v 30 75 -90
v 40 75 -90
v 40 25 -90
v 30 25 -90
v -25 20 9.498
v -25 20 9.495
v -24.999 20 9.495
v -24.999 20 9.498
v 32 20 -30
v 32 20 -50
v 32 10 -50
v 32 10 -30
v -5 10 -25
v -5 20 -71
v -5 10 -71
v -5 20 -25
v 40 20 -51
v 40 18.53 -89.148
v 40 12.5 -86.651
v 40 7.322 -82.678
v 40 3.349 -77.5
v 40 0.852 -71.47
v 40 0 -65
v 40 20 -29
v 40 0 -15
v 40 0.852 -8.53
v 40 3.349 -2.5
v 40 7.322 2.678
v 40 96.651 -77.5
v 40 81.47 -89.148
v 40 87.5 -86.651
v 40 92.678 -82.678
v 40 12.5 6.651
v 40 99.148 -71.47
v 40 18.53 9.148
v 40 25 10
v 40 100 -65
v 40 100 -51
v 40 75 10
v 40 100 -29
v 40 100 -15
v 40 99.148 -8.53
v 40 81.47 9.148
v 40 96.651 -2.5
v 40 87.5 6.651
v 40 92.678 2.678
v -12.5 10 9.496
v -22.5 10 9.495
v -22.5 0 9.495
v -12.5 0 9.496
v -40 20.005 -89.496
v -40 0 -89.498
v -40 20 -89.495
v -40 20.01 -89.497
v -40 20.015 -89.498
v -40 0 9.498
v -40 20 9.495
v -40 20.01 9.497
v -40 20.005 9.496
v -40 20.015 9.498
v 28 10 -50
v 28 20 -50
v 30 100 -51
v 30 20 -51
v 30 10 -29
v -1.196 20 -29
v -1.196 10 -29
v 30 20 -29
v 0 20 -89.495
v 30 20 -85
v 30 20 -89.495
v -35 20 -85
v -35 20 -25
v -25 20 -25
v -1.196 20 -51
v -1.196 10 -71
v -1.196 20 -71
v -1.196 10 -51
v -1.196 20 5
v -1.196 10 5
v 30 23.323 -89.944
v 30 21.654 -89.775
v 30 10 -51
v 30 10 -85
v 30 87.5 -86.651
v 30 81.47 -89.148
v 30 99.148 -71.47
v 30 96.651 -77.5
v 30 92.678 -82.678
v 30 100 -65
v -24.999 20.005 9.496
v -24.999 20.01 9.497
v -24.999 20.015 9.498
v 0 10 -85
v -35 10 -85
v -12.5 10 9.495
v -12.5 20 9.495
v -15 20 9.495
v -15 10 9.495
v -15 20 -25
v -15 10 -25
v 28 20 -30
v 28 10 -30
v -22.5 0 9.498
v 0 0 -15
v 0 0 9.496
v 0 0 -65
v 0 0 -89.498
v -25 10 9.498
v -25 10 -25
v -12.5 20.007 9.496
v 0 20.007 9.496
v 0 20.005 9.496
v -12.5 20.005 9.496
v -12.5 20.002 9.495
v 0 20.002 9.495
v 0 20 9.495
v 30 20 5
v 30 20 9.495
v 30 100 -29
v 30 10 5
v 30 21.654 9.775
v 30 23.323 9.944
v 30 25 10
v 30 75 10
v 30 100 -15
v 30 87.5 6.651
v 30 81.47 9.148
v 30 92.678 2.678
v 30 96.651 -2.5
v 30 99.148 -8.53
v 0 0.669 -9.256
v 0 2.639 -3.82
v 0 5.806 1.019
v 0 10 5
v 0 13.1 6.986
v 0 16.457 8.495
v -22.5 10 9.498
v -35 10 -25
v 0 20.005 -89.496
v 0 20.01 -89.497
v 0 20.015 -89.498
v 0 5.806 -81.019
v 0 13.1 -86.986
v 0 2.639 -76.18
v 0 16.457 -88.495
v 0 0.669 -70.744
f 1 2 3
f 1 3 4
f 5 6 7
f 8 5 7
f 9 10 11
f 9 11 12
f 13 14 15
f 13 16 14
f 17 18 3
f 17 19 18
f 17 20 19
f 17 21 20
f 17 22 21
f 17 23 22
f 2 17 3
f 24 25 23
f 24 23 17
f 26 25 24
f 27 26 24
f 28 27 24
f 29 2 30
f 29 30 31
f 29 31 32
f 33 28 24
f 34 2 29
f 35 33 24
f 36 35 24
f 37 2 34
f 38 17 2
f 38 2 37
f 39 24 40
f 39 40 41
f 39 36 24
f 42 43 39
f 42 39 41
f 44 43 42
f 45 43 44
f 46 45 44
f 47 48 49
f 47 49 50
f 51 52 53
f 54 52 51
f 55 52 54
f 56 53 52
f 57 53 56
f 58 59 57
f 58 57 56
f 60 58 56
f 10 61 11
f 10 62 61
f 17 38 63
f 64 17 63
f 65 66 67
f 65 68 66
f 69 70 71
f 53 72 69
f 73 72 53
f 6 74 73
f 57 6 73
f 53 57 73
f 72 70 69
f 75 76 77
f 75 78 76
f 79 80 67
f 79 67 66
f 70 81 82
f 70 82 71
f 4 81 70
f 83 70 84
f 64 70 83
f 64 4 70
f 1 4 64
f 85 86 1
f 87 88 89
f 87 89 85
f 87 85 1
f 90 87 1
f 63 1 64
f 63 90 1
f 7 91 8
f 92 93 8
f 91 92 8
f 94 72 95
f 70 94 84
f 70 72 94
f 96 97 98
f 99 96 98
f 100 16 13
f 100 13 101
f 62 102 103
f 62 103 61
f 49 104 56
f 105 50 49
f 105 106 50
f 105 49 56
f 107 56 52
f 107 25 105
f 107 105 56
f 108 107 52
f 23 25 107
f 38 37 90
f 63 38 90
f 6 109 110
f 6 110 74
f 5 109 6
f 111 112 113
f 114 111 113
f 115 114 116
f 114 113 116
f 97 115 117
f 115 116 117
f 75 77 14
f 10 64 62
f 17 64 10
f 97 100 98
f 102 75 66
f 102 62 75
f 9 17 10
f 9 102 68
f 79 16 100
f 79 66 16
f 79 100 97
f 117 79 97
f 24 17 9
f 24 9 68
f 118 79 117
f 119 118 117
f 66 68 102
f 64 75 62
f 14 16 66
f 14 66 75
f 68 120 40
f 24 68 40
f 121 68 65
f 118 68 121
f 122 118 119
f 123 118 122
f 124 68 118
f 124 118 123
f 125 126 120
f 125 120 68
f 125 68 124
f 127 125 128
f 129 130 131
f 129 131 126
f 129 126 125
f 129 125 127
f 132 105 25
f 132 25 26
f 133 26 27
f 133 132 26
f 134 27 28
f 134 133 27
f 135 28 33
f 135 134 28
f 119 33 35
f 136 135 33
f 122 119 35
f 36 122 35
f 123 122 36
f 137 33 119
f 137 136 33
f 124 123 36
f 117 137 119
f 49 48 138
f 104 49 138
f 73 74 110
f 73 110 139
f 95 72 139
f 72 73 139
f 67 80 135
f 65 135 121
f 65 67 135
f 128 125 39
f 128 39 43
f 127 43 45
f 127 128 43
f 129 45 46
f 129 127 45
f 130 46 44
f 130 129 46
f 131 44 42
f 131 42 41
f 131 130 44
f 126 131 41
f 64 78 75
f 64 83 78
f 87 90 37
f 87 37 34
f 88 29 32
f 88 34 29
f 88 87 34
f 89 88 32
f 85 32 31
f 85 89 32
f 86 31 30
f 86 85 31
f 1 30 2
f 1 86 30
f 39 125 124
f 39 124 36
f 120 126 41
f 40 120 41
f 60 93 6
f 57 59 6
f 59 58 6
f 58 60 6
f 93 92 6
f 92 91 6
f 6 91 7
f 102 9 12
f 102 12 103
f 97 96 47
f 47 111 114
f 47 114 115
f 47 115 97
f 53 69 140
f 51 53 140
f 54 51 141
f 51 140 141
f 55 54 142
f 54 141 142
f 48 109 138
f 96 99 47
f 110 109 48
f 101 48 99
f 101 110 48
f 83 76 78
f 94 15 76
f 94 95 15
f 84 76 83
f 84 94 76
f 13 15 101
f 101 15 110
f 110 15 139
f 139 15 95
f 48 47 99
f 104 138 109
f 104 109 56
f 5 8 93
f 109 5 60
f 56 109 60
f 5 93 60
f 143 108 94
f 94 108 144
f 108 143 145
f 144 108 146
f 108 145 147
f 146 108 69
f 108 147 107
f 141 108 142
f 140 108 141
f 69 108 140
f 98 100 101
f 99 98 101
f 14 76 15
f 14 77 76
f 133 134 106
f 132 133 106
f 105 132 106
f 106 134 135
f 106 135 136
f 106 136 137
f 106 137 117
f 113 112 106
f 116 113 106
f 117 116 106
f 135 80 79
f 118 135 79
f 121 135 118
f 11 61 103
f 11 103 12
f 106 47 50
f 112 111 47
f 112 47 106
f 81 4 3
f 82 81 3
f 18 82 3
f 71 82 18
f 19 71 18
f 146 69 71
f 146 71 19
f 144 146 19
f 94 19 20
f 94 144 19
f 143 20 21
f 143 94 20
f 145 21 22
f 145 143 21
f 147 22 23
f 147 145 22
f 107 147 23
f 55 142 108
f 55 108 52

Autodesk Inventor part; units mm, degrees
ref_plane "YZ Plane" through (0, 0, 0) normal (1, 0, 0) x (0, 1, 0)
sketch "Esquisse1" plane through (0, 0, 0) normal (0, 1, 0) x (-1, 0, 0)
  line L0 (0, 0) -> (-40, 0)
  line L1 (-40, 0) -> (-40, -80)
  line L2 (-40, -80) -> (0, -80)
  line L3 (0, -80) -> (0, 0)
  dimension "d0" = 80
  dimension "d4" = 40
extrude "Extrusion1" add sketch "Esquisse1" along normal blind 80
sketch "Esquisse2" plane through (40, 0, 0) normal (1, 0, 0) x (0, 0, -1)
  point P0 (0, 0)
sketch "Esquisse3" plane through (40, 0, 0) normal (1, 0, 0) x (0, 0, -1)
  line L0 (0, 80) -> (80, 80) projected
  line L1 (20, 20) -> (60, 20)
  line L2 (60, 20) -> (60, 80)
  line L3 (60, 80) -> (20, 80)
  line L4 (20, 80) -> (20, 20)
  line L5 (0, 0) -> (80, 0) projected
  line L6 (80, 0) -> (80, 80) projected
  line L7 (0, 0) -> (0, 80) projected
  point P0 (20, 80)
  dimension "d9" = 20
  dimension "d10" = 20
  dimension "d11" = 20
extrude "Extrusion2" cut sketch "Esquisse3" against normal blind 80 contours L0 L2 L1 L4
sketch "Esquisse4" plane through (40, 20, -20) normal (0, 1, 0) x (1, 0, 0)
  line L0 (0, 40) -> (-40, 40) projected
  line L1 (0, 0) -> (-5, 0)
  line L2 (-5, 40) -> (0, 40)
  line L3 (0, 40) -> (0, 0)
  line L4 (-5, 40) -> (-10, 40)
  line L5 (-9, 10) -> (-12, 10)
  line L6 (-12, 10) -> (-12, 30)
  line L7 (-12, 30) -> (-9, 30)
  line L8 (-9, 10) -> (-9, 30)
  point P0 (-40, -20)
  dimension "d19" = 20
  dimension "d21" = 9
  dimension "d22" = 3
extrude "Extrusion3" cut sketch "Esquisse4" against normal blind 10
sketch "Esquisse6" plane through (40, 20, -20) normal (0, 0, -1) x (-1, 0, 0)
  line L0 (40, 60) -> (40, 0) projected
  line L1 (0, 60) -> (40, 60) projected
  line L2 (0, 0) -> (0, 60) projected
  line L3 (0, 0) -> (40, 0) projected
  point P0 (40, -20)
extrude "Extrusion4" add sketch "Esquisse6" along normal blind 9
sketch "Esquisse7" plane through (40, 20, -60) normal (0, 0, 1) x (1, 0, 0)
  line L0 (-40, 0) -> (-40, 60) projected
  line L1 (0, 0) -> (-40, 0) projected
  line L2 (0, 60) -> (0, 0) projected
  line L3 (-40, 60) -> (0, 60) projected
  point P0 (-40, -20)
extrude "Extrusion5" add sketch "Esquisse7" along normal blind 9
sketch "Esquisse8" plane through (0, 80, 0) normal (0, 1, 0) x (1, 0, 0)
  line L0 (40, 51) -> (40, 80) projected
  line L1 (40, 80) -> (0, 80) projected
  line L2 (0, 80) -> (0, 51) projected
  line L3 (40, 51) -> (0, 51) projected
  point P0 (0, 0)
extrude "Extrusion6" add sketch "Esquisse8" along normal blind 20
sketch "Esquisse9" plane through (0, 80, 0) normal (0, 1, 0) x (1, 0, 0)
  line L0 (0, 29) -> (0, 0) projected
  line L1 (0, 0) -> (40, 0) projected
  line L2 (40, 0) -> (40, 29) projected
  line L3 (0, 29) -> (40, 29) projected
extrude "Extrusion7" add sketch "Esquisse9" along normal blind 20
sketch "Esquisse10" plane through (0, 0, 0) normal (0, 0, 1) x (1, 0, 0)
  line L0 (0, 0) -> (40, 0) projected
  line L1 (40, 0) -> (40, 100) projected
  line L2 (0, 100) -> (40, 100) projected
  line L3 (0, 0) -> (0, 100) projected
extrude "Extrusion8" add sketch "Esquisse10" along normal blind 10
sketch "Esquisse11" plane through (40, 0, -80) normal (0, 0, -1) x (-1, 0, 0)
  line L0 (0, 0) -> (40, 0) projected
  line L1 (40, 0) -> (40, 100) projected
  line L2 (0, 100) -> (40, 100) projected
  line L3 (0, 0) -> (0, 100) projected
extrude "Extrusion9" add sketch "Esquisse11" along normal blind 10
sketch "Esquisse12" plane through (0, 20, -51) normal (-1, 0, 0) x (0, 0, 1)
  line L0 (22, 80) -> (61, 80) projected
  line L1 (61, 80) -> (36, 80)
  line L2 (61, 80) -> (61, 55)
  line L3 (61, 80) -> (61, -20) projected
  arc A0 (61, 55) -> (36, 80) centre (36, 55) ccw
  point P0 (51, -20)
  dimension "d35" = 25
  dimension "d36" = 25
ref_plane "Plan de construction1" through (40, 0, -40) normal (0, 0, -1) x (-1, 0, 0)
extrude "Extrusion10" cut sketch "Esquisse12" against normal up to surface (40 mm away)
mirror "Symétrie1" about plane through (40, 0, -40) normal (0, 0, -1) of "Extrusion10"
ref_plane "Plan de construction2" through (0, 50, 0) normal (0, 1, 0) x (1, 0, 0)
mirror "Symétrie2" about plane through (0, 50, 0) normal (0, 1, 0) of "Extrusion10", "Symétrie1"
sketch "Esquisse13" plane through (0, 20, -51) normal (-1, 0, 0) x (0, 0, 1)
  line L0 (11, -10) -> (-14, -10)
  line L1 (11, -10) -> (36, -10)
  line L2 (-14, -10) -> (-14, 0)
  line L3 (-14, 0) -> (-38.4949, 0)
  line L4 (36, -10) -> (36, 0)
  line L5 (36, 0) -> (60.4949, 0)
  arc A0 (-38.4949, 0) -> (-14, -20) centre (-14, 5) ccw
  arc A1 (36, -20) -> (60.4949, 0) centre (36, 5) ccw
  line L6 (36, -20) -> (-14, -20)
  point P0 (51, -20)
  dimension "d40" = 25
  dimension "d41" = 25
  dimension "d42" = 10
extrude "Extrusion11" add sketch "Esquisse13" along normal blind 40
sketch "Esquisse14" plane through (0, 10, -15) normal (0, 1, 0) x (1, 0, 0)
  line L0 (-40, 0) -> (-40, 50) projected
  line L1 (-40, 0) -> (40, 0) projected
  line L2 (-40, 50) -> (-35, 50)
  line L3 (-35, 50) -> (-35, 0)
  line L4 (-35, 0) -> (-40, 0)
  line L5 (-40, 0) -> (-40, 50)
  point P0 (0, -15)
  dimension "d45" = 5
extrude "Extrusion12" add sketch "Esquisse14" along normal up to surface (10 mm away)
sketch "Esquisse15" plane through (0, 20, 9.4949) normal (0, 1, 0) x (1, 0, 0)
  line L0 (-17.5, 24.4949) -> (-12.5, 24.4949)
  line L1 (-12.5, 24.4949) -> (-22.5, 24.4949)
  line L2 (-22.5, 24.4949) -> (-22.5, 0)
  line L3 (-12.5, 24.4949) -> (-12.5, 0)
  line L4 (-22.5, 0) -> (-12.5, 0)
  dimension "d48" = 5
  dimension "d49" = 10
extrude "Extrusion13" cut sketch "Esquisse15" against normal up to surface (10 mm away)
sketch "Esquisse16" plane through (40, 20, -51) normal (0, 0, 1) x (1, 0, 0)
  point P0 (-40, -20)
sketch "Esquisse17" plane through (31, 20, -50) normal (-1, 0, 0) x (0, 0, 1)
  line L0 (0, 0) -> (20, 0) projected
  line L1 (0, 0) -> (0, -10) projected
  line L2 (0, -10) -> (20, -10) projected
  line L3 (20, 0) -> (20, -10) projected
  point P0 (50, -20)
extrude "Extrusion14" cut sketch "Esquisse17" against normal blind 1
sketch "Esquisse18" plane through (0, 20, -51) normal (-1, 0, 0) x (0, 0, 1)
  line L0 (22, 0) -> (22, 80)
  line L1 (22, 80) -> (36, 80)
  arc A0 (61, 55) -> (36, 80) centre (36, 55) ccw
  line L2 (-38.4949, 0) -> (-14, 0)
  line L3 (36, 0) -> (60.4949, 0)
  arc A1 (60.4949, 0) -> (61, 5) centre (36, 5) ccw
  line L4 (61, 55) -> (61, 5)
  arc A2 (61, 55) -> (36, 80) centre (36, 55) ccw
  line L5 (22, 80) -> (36, 80)
  line L6 (22, 0) -> (22, 80)
  line L7 (22, 0) -> (0, 0)
  line L8 (0, 0) -> (0, 80)
  line L9 (0, 80) -> (-14, 80)
  arc A3 (-14, 80) -> (-39, 55) centre (-14, 55) ccw
  line L10 (-39, 5) -> (-39, 55)
  arc A4 (-39, 5) -> (-38.4949, 0) centre (-14, 5) ccw
  arc A5 (-39, 5) -> (-38.4949, 0) centre (-14, 5) ccw
  line L11 (-38.4949, 0) -> (60.4949, 0)
  point P0 (51, -20)
  point P1 (61, 55)
  point P2 (22, 0)
  point P3 (36, 0)
extrude "Extrusion15" cut sketch "Esquisse18" against normal blind 30
sketch "Esquisse19" plane through (0, 10, -65) normal (0, 0, 1) x (1, 0, 0)
  line L0 (-35, 10) -> (-35, 0) projected
  line L1 (0, 0) -> (-35, 0) projected
  line L2 (0, 10) -> (0, 0) projected
  line L3 (0, 10) -> (-35, 10) projected
  point P0 (0, -10)
extrude "Extrusion16" cut sketch "Esquisse19" against normal blind 20
sketch "Esquisse20" plane through (0, 10, -15) normal (-1, 0, 0) x (0, 0, 1)
  arc A0 (0, -10) -> (25, 15) centre (0, 15) ccw projected
  line L0 (25, 15) -> (25, -10)
  line L1 (25, -10) -> (0, -10)
  line L2 (24.498, 10.0154) -> (25, 10.0154)
  point P0 (15, -10)
extrude "Extrusion17" add sketch "Esquisse20" along normal up to surface (40 mm away) contours A0 L2 L0 L1
mirror "Symétrie3" about plane through (40, 0, -40) normal (0, 0, -1) of "Extrusion17"
sketch "Esquisse21" plane through (0, 0, 10) normal (0, 0, 1) x (1, 0, 0)
  line L0 (-22.5, 20) -> (-22.5, 10) projected
  line L1 (-12.5, 10) -> (-12.5, 20) projected
  line L2 (-22.5, 10) -> (-35, 10) projected
  line L3 (-12.5, 10) -> (-22.5, 10) projected
  line L4 (0, 10) -> (-12.5, 10) projected
  line L5 (-35, 10) -> (0, 10) projected
  line L6 (0, 20) -> (-12.5, 20) projected
  line L7 (-22.5, 20) -> (-22.5, 21.5856)
  line L8 (-12.5, 20) -> (-12.5, 21.5856)
  line L9 (-12.5, 21.5856) -> (-22.5, 21.5856)
  point P0 (0, 0)
  point P1 (-22.5, 10)
  point P2 (-12.5, 10)
extrude "Extrusion18" cut sketch "Esquisse21" against normal blind 20
sketch "Esquisse23" plane through (40, 20, -29) normal (0, 1, 0) x (1, 0, 0)
  line L0 (-40, -14) -> (-40, 56)
  line L1 (-10, 0) -> (0, 0)
  line L2 (-8, 22) -> (-10, 22)
  line L3 (-10, 22) -> (-10, 56)
  line L4 (-8, 1) -> (-12, 1)
  line L5 (-12, 21) -> (-8, 21)
  line L6 (-8, 21) -> (-8, 1)
  line L7 (-10, 22) -> (-10, 56)
  line L8 (-10, 22) -> (-40, 22)
  line L9 (-40, -14) -> (-40, 56)
  line L10 (-10, 22) -> (-10, 56)
  line L11 (-40, 56) -> (-10, 56)
  point P0 (-10, -38.4949)
  point P1 (-40, 22)
extrude "Extrusion20" cut sketch "Esquisse23" against normal blind 10
mirror "Symétrie4" about plane through (40, 0, -40) normal (0, 0, -1) of "Extrusion20"
sketch "Esquisse24" plane through (0, 20, 9.4949) normal (0, 1, 0) x (1, 0, 0)
  point P0 (0, 9.4949)
sketch "Esquisse25" plane through (0, 20, 9.4949) normal (0, 1, 0) x (1, 0, 0)
  point P0 (0, 9.4949)
sketch "Esquisse26" plane through (0, 0, 10) normal (0, 0, 1) x (1, 0, 0)
  point P0 (0, 0)
sketch "Esquisse27" plane through (-40, 20.0154, 9.498) normal (0, 1, 0) x (1, 0, 0)
  line L0 (27.5, -0.502) -> (27.5, 24.498) projected
  line L1 (40, 24.498) -> (40, -0.502) projected
  line L2 (27.5, 0.0017) -> (40, 0.0017)
  line L3 (40, 0.0017) -> (40, -0.502)
  line L4 (40, -0.502) -> (27.5, -0.502)
  line L5 (27.5, -0.502) -> (27.5, 0.0017)
  point P0 (40, 9.498)
extrude "Extrusion21" cut sketch "Esquisse27" against normal blind 25
sketch "Esquisse28" plane through (-40, 20.0154, 9.498) normal (0, 1, 0) x (1, 0, 0)
  point P0 (40, 9.498)
sketch "Esquisse29" plane through (-40, 20.0154, 9.498) normal (0, 1, 0) x (1, 0, 0)
  line L0 (17.5, -0.502) -> (17.5, 0) projected
  line L1 (17.5, 0) -> (0, 0) projected
  line L2 (0, 0) -> (0, -0.502) projected
  line L3 (17.5, -0.502) -> (0, -0.502) projected
  point P0 (40, 9.498)
extrude "Extrusion22" cut sketch "Esquisse29" against normal up to surface (20.0154 mm away)
sketch "Esquisse30" plane through (-35, 10, -15) normal (0, 1, 0) x (1, 0, 0)
  line L0 (22.5, -25) -> (12.5, -25) projected
  line L1 (12.5, -25) -> (12.5, -24.4949)
  line L2 (22.5, -24.4963) -> (22.5, 0) projected
  line L3 (12.5, -24.4949) -> (22.5, -24.4963)
  line L4 (22.5, -25) -> (22.5, -24.4963) projected
  line L5 (22.5, -24.4963) -> (22.5, -25)
  point P0 (35, -15)
extrude "Extrusion23" cut sketch "Esquisse30" against normal up to surface (10 mm away)
sketch "Esquisse31" plane through (-40, 20.0154, -89.498) normal (0, 1, 0) x (1, 0, 0)
  line L0 (0, 0) -> (0, 0.502) projected
  line L1 (40, 0) -> (0, 0) projected
  line L2 (40, 0.502) -> (40, 0) projected
  line L3 (40, 0.502) -> (0, 0.502) projected
  point P0 (40, -89.498)
extrude "Extrusion24" cut sketch "Esquisse31" against normal up to surface (20.0154 mm away)
sketch "Esquisse32" plane through (0, 10, -51) normal (-1, 0, 0) x (0, 0, 1)
  line L0 (0, 0) -> (0, 10)
  line L1 (0, 10) -> (22, 10)
  line L2 (22, 10) -> (22, 0)
  line L3 (22, 0) -> (0, 0)
  point P0 (51, -10)
extrude "Extrusion25" add sketch "Esquisse32" along normal blind 5
sketch "Esquisse37" plane through (-35, 20, -15) normal (0, 1, 0) x (1, 0, 0)
  line L0 (12.5, 0) -> (0, 0) projected
  line L1 (12.5, 0) -> (10, 0)
  line L2 (10, 0) -> (10, -25.2265)
  line L3 (10, -25.2265) -> (12.5, -25.2265)
  line L4 (12.5, -25.2265) -> (12.5, 0)
  point P0 (35, -15)
  dimension "d78" = 2.5
extrude "Extrusion27" cut sketch "Esquisse37" against normal blind 10
sketch "Esquisse39" plane through (0, 20, 9.4949) normal (0, 1, 0) x (1, 0, 0)
  line L0 (-12.5, 24.4949) -> (-12.5, 0) projected
  line L1 (-12.5, 24.4949) -> (-12.5, 0)
  line L2 (-12.5, 0) -> (-15, 0)
  line L3 (-15, 0) -> (-15, 24.4949)
  line L4 (-15, 24.4949) -> (-12.5, 24.4949)
  point P0 (0, 9.4949)
  dimension "d81" = 2.5
extrude "Extrusion28" add sketch "Esquisse39" against normal blind 10
sketch "Esquisse40" plane through (-35, 10, -15) normal (0, 1, 0) x (1, 0, 0)
  line L0 (30, 14) -> (30, 36) projected
  line L1 (30, 14) -> (30, 0)
  line L2 (35, 0) -> (20, 0) projected
  line L3 (35, -20) -> (35, 0) projected
  line L4 (35, -20) -> (35, 0)
  line L5 (35, 0) -> (30, 0)
  line L6 (30, 0) -> (30, -20)
  line L7 (30, -20) -> (35, -20)
  point P0 (35, -15)
  point P1 (30, 0)
extrude "Extrusion29" cut sketch "Esquisse40" along normal blind 10
sketch "Esquisse41" plane through (-15, 10, -15) normal (0, 0, -1) x (-1, 0, 0)
  line L0 (-10, 10) -> (-10, 0) projected
  line L1 (-10, 10) -> (0, 10) projected
  line L2 (-10, 0) -> (-10, 10)
  line L3 (-10, 10) -> (0, 10)
  line L4 (0, 10) -> (0, 0)
  line L5 (0, 0) -> (-10, 0)
  point P0 (-15, -10)
extrude "Extrusion30" add sketch "Esquisse41" along normal blind 10
sketch "Esquisse42" plane through (0, 20, 9.4949) normal (0, 1, 0) x (1, 0, 0)
  point P0 (0, 9.4949)
sketch "Esquisse43" plane through (-35, 10, -15) normal (0, 0, -1) x (-1, 0, 0)
  point P0 (-35, -10)
sketch "Esquisse44" plane through (-35, 10, -15) normal (0, 0, -1) x (-1, 0, 0)
  line L0 (-10, 0) -> (0, 0) projected
  line L1 (-10, 10) -> (0, 10) projected
  line L2 (-10, 0) -> (-10, 10)
  line L3 (-10, 10) -> (0, 10)
  line L4 (0, 10) -> (0, 0)
  line L5 (0, 0) -> (-10, 0)
  point P0 (-35, -10)
extrude "Extrusion31" add sketch "Esquisse44" along normal blind 10
sketch "Esquisse45" plane through (30, 10, -51) normal (0, 0, -1) x (-1, 0, 0)
  line L0 (0, 10) -> (35, 10) projected
  line L1 (35, 10) -> (35, 0) projected
  line L2 (35, 10) -> (35, 0)
  line L3 (35, 0) -> (31.1961, 0)
  line L4 (31.1961, 0) -> (31.1961, 10)
  line L5 (31.1961, 10) -> (35, 10)
  point P0 (30, -10)
extrude "Extrusion32" add sketch "Esquisse45" along normal blind 20 and the other way blind 60
sketch "Esquisse46" plane through (-40, 20.0154, 9.498) normal (0, 0, 1) x (1, 0, 0)
  line L0 (17.5, 0) -> (17.5, -0.0154) projected
  line L1 (17.5, -0.0154) -> (17.5, 0)
  line L2 (17.5, 0) -> (15.0008, 0)
  line L3 (15.0008, 0) -> (15.0008, -0.0154)
  line L4 (15.0008, -0.0154) -> (17.5, -0.0154)
  point P0 (40, -20.0154)
extrude "Extrusion33" cut sketch "Esquisse46" against normal blind 1
sketch "Esquisse47" plane through (-12.5, 20.0069, 9.4963) normal (0, 0, 1) x (1, 0, 0)
  point P0 (12.5, -20.0069)
ref_plane "Plan de construction3" through (40, 0, -40) normal (0, 0, -1) x (-1, 0, 0)
properties part number "_Impression 3D"
